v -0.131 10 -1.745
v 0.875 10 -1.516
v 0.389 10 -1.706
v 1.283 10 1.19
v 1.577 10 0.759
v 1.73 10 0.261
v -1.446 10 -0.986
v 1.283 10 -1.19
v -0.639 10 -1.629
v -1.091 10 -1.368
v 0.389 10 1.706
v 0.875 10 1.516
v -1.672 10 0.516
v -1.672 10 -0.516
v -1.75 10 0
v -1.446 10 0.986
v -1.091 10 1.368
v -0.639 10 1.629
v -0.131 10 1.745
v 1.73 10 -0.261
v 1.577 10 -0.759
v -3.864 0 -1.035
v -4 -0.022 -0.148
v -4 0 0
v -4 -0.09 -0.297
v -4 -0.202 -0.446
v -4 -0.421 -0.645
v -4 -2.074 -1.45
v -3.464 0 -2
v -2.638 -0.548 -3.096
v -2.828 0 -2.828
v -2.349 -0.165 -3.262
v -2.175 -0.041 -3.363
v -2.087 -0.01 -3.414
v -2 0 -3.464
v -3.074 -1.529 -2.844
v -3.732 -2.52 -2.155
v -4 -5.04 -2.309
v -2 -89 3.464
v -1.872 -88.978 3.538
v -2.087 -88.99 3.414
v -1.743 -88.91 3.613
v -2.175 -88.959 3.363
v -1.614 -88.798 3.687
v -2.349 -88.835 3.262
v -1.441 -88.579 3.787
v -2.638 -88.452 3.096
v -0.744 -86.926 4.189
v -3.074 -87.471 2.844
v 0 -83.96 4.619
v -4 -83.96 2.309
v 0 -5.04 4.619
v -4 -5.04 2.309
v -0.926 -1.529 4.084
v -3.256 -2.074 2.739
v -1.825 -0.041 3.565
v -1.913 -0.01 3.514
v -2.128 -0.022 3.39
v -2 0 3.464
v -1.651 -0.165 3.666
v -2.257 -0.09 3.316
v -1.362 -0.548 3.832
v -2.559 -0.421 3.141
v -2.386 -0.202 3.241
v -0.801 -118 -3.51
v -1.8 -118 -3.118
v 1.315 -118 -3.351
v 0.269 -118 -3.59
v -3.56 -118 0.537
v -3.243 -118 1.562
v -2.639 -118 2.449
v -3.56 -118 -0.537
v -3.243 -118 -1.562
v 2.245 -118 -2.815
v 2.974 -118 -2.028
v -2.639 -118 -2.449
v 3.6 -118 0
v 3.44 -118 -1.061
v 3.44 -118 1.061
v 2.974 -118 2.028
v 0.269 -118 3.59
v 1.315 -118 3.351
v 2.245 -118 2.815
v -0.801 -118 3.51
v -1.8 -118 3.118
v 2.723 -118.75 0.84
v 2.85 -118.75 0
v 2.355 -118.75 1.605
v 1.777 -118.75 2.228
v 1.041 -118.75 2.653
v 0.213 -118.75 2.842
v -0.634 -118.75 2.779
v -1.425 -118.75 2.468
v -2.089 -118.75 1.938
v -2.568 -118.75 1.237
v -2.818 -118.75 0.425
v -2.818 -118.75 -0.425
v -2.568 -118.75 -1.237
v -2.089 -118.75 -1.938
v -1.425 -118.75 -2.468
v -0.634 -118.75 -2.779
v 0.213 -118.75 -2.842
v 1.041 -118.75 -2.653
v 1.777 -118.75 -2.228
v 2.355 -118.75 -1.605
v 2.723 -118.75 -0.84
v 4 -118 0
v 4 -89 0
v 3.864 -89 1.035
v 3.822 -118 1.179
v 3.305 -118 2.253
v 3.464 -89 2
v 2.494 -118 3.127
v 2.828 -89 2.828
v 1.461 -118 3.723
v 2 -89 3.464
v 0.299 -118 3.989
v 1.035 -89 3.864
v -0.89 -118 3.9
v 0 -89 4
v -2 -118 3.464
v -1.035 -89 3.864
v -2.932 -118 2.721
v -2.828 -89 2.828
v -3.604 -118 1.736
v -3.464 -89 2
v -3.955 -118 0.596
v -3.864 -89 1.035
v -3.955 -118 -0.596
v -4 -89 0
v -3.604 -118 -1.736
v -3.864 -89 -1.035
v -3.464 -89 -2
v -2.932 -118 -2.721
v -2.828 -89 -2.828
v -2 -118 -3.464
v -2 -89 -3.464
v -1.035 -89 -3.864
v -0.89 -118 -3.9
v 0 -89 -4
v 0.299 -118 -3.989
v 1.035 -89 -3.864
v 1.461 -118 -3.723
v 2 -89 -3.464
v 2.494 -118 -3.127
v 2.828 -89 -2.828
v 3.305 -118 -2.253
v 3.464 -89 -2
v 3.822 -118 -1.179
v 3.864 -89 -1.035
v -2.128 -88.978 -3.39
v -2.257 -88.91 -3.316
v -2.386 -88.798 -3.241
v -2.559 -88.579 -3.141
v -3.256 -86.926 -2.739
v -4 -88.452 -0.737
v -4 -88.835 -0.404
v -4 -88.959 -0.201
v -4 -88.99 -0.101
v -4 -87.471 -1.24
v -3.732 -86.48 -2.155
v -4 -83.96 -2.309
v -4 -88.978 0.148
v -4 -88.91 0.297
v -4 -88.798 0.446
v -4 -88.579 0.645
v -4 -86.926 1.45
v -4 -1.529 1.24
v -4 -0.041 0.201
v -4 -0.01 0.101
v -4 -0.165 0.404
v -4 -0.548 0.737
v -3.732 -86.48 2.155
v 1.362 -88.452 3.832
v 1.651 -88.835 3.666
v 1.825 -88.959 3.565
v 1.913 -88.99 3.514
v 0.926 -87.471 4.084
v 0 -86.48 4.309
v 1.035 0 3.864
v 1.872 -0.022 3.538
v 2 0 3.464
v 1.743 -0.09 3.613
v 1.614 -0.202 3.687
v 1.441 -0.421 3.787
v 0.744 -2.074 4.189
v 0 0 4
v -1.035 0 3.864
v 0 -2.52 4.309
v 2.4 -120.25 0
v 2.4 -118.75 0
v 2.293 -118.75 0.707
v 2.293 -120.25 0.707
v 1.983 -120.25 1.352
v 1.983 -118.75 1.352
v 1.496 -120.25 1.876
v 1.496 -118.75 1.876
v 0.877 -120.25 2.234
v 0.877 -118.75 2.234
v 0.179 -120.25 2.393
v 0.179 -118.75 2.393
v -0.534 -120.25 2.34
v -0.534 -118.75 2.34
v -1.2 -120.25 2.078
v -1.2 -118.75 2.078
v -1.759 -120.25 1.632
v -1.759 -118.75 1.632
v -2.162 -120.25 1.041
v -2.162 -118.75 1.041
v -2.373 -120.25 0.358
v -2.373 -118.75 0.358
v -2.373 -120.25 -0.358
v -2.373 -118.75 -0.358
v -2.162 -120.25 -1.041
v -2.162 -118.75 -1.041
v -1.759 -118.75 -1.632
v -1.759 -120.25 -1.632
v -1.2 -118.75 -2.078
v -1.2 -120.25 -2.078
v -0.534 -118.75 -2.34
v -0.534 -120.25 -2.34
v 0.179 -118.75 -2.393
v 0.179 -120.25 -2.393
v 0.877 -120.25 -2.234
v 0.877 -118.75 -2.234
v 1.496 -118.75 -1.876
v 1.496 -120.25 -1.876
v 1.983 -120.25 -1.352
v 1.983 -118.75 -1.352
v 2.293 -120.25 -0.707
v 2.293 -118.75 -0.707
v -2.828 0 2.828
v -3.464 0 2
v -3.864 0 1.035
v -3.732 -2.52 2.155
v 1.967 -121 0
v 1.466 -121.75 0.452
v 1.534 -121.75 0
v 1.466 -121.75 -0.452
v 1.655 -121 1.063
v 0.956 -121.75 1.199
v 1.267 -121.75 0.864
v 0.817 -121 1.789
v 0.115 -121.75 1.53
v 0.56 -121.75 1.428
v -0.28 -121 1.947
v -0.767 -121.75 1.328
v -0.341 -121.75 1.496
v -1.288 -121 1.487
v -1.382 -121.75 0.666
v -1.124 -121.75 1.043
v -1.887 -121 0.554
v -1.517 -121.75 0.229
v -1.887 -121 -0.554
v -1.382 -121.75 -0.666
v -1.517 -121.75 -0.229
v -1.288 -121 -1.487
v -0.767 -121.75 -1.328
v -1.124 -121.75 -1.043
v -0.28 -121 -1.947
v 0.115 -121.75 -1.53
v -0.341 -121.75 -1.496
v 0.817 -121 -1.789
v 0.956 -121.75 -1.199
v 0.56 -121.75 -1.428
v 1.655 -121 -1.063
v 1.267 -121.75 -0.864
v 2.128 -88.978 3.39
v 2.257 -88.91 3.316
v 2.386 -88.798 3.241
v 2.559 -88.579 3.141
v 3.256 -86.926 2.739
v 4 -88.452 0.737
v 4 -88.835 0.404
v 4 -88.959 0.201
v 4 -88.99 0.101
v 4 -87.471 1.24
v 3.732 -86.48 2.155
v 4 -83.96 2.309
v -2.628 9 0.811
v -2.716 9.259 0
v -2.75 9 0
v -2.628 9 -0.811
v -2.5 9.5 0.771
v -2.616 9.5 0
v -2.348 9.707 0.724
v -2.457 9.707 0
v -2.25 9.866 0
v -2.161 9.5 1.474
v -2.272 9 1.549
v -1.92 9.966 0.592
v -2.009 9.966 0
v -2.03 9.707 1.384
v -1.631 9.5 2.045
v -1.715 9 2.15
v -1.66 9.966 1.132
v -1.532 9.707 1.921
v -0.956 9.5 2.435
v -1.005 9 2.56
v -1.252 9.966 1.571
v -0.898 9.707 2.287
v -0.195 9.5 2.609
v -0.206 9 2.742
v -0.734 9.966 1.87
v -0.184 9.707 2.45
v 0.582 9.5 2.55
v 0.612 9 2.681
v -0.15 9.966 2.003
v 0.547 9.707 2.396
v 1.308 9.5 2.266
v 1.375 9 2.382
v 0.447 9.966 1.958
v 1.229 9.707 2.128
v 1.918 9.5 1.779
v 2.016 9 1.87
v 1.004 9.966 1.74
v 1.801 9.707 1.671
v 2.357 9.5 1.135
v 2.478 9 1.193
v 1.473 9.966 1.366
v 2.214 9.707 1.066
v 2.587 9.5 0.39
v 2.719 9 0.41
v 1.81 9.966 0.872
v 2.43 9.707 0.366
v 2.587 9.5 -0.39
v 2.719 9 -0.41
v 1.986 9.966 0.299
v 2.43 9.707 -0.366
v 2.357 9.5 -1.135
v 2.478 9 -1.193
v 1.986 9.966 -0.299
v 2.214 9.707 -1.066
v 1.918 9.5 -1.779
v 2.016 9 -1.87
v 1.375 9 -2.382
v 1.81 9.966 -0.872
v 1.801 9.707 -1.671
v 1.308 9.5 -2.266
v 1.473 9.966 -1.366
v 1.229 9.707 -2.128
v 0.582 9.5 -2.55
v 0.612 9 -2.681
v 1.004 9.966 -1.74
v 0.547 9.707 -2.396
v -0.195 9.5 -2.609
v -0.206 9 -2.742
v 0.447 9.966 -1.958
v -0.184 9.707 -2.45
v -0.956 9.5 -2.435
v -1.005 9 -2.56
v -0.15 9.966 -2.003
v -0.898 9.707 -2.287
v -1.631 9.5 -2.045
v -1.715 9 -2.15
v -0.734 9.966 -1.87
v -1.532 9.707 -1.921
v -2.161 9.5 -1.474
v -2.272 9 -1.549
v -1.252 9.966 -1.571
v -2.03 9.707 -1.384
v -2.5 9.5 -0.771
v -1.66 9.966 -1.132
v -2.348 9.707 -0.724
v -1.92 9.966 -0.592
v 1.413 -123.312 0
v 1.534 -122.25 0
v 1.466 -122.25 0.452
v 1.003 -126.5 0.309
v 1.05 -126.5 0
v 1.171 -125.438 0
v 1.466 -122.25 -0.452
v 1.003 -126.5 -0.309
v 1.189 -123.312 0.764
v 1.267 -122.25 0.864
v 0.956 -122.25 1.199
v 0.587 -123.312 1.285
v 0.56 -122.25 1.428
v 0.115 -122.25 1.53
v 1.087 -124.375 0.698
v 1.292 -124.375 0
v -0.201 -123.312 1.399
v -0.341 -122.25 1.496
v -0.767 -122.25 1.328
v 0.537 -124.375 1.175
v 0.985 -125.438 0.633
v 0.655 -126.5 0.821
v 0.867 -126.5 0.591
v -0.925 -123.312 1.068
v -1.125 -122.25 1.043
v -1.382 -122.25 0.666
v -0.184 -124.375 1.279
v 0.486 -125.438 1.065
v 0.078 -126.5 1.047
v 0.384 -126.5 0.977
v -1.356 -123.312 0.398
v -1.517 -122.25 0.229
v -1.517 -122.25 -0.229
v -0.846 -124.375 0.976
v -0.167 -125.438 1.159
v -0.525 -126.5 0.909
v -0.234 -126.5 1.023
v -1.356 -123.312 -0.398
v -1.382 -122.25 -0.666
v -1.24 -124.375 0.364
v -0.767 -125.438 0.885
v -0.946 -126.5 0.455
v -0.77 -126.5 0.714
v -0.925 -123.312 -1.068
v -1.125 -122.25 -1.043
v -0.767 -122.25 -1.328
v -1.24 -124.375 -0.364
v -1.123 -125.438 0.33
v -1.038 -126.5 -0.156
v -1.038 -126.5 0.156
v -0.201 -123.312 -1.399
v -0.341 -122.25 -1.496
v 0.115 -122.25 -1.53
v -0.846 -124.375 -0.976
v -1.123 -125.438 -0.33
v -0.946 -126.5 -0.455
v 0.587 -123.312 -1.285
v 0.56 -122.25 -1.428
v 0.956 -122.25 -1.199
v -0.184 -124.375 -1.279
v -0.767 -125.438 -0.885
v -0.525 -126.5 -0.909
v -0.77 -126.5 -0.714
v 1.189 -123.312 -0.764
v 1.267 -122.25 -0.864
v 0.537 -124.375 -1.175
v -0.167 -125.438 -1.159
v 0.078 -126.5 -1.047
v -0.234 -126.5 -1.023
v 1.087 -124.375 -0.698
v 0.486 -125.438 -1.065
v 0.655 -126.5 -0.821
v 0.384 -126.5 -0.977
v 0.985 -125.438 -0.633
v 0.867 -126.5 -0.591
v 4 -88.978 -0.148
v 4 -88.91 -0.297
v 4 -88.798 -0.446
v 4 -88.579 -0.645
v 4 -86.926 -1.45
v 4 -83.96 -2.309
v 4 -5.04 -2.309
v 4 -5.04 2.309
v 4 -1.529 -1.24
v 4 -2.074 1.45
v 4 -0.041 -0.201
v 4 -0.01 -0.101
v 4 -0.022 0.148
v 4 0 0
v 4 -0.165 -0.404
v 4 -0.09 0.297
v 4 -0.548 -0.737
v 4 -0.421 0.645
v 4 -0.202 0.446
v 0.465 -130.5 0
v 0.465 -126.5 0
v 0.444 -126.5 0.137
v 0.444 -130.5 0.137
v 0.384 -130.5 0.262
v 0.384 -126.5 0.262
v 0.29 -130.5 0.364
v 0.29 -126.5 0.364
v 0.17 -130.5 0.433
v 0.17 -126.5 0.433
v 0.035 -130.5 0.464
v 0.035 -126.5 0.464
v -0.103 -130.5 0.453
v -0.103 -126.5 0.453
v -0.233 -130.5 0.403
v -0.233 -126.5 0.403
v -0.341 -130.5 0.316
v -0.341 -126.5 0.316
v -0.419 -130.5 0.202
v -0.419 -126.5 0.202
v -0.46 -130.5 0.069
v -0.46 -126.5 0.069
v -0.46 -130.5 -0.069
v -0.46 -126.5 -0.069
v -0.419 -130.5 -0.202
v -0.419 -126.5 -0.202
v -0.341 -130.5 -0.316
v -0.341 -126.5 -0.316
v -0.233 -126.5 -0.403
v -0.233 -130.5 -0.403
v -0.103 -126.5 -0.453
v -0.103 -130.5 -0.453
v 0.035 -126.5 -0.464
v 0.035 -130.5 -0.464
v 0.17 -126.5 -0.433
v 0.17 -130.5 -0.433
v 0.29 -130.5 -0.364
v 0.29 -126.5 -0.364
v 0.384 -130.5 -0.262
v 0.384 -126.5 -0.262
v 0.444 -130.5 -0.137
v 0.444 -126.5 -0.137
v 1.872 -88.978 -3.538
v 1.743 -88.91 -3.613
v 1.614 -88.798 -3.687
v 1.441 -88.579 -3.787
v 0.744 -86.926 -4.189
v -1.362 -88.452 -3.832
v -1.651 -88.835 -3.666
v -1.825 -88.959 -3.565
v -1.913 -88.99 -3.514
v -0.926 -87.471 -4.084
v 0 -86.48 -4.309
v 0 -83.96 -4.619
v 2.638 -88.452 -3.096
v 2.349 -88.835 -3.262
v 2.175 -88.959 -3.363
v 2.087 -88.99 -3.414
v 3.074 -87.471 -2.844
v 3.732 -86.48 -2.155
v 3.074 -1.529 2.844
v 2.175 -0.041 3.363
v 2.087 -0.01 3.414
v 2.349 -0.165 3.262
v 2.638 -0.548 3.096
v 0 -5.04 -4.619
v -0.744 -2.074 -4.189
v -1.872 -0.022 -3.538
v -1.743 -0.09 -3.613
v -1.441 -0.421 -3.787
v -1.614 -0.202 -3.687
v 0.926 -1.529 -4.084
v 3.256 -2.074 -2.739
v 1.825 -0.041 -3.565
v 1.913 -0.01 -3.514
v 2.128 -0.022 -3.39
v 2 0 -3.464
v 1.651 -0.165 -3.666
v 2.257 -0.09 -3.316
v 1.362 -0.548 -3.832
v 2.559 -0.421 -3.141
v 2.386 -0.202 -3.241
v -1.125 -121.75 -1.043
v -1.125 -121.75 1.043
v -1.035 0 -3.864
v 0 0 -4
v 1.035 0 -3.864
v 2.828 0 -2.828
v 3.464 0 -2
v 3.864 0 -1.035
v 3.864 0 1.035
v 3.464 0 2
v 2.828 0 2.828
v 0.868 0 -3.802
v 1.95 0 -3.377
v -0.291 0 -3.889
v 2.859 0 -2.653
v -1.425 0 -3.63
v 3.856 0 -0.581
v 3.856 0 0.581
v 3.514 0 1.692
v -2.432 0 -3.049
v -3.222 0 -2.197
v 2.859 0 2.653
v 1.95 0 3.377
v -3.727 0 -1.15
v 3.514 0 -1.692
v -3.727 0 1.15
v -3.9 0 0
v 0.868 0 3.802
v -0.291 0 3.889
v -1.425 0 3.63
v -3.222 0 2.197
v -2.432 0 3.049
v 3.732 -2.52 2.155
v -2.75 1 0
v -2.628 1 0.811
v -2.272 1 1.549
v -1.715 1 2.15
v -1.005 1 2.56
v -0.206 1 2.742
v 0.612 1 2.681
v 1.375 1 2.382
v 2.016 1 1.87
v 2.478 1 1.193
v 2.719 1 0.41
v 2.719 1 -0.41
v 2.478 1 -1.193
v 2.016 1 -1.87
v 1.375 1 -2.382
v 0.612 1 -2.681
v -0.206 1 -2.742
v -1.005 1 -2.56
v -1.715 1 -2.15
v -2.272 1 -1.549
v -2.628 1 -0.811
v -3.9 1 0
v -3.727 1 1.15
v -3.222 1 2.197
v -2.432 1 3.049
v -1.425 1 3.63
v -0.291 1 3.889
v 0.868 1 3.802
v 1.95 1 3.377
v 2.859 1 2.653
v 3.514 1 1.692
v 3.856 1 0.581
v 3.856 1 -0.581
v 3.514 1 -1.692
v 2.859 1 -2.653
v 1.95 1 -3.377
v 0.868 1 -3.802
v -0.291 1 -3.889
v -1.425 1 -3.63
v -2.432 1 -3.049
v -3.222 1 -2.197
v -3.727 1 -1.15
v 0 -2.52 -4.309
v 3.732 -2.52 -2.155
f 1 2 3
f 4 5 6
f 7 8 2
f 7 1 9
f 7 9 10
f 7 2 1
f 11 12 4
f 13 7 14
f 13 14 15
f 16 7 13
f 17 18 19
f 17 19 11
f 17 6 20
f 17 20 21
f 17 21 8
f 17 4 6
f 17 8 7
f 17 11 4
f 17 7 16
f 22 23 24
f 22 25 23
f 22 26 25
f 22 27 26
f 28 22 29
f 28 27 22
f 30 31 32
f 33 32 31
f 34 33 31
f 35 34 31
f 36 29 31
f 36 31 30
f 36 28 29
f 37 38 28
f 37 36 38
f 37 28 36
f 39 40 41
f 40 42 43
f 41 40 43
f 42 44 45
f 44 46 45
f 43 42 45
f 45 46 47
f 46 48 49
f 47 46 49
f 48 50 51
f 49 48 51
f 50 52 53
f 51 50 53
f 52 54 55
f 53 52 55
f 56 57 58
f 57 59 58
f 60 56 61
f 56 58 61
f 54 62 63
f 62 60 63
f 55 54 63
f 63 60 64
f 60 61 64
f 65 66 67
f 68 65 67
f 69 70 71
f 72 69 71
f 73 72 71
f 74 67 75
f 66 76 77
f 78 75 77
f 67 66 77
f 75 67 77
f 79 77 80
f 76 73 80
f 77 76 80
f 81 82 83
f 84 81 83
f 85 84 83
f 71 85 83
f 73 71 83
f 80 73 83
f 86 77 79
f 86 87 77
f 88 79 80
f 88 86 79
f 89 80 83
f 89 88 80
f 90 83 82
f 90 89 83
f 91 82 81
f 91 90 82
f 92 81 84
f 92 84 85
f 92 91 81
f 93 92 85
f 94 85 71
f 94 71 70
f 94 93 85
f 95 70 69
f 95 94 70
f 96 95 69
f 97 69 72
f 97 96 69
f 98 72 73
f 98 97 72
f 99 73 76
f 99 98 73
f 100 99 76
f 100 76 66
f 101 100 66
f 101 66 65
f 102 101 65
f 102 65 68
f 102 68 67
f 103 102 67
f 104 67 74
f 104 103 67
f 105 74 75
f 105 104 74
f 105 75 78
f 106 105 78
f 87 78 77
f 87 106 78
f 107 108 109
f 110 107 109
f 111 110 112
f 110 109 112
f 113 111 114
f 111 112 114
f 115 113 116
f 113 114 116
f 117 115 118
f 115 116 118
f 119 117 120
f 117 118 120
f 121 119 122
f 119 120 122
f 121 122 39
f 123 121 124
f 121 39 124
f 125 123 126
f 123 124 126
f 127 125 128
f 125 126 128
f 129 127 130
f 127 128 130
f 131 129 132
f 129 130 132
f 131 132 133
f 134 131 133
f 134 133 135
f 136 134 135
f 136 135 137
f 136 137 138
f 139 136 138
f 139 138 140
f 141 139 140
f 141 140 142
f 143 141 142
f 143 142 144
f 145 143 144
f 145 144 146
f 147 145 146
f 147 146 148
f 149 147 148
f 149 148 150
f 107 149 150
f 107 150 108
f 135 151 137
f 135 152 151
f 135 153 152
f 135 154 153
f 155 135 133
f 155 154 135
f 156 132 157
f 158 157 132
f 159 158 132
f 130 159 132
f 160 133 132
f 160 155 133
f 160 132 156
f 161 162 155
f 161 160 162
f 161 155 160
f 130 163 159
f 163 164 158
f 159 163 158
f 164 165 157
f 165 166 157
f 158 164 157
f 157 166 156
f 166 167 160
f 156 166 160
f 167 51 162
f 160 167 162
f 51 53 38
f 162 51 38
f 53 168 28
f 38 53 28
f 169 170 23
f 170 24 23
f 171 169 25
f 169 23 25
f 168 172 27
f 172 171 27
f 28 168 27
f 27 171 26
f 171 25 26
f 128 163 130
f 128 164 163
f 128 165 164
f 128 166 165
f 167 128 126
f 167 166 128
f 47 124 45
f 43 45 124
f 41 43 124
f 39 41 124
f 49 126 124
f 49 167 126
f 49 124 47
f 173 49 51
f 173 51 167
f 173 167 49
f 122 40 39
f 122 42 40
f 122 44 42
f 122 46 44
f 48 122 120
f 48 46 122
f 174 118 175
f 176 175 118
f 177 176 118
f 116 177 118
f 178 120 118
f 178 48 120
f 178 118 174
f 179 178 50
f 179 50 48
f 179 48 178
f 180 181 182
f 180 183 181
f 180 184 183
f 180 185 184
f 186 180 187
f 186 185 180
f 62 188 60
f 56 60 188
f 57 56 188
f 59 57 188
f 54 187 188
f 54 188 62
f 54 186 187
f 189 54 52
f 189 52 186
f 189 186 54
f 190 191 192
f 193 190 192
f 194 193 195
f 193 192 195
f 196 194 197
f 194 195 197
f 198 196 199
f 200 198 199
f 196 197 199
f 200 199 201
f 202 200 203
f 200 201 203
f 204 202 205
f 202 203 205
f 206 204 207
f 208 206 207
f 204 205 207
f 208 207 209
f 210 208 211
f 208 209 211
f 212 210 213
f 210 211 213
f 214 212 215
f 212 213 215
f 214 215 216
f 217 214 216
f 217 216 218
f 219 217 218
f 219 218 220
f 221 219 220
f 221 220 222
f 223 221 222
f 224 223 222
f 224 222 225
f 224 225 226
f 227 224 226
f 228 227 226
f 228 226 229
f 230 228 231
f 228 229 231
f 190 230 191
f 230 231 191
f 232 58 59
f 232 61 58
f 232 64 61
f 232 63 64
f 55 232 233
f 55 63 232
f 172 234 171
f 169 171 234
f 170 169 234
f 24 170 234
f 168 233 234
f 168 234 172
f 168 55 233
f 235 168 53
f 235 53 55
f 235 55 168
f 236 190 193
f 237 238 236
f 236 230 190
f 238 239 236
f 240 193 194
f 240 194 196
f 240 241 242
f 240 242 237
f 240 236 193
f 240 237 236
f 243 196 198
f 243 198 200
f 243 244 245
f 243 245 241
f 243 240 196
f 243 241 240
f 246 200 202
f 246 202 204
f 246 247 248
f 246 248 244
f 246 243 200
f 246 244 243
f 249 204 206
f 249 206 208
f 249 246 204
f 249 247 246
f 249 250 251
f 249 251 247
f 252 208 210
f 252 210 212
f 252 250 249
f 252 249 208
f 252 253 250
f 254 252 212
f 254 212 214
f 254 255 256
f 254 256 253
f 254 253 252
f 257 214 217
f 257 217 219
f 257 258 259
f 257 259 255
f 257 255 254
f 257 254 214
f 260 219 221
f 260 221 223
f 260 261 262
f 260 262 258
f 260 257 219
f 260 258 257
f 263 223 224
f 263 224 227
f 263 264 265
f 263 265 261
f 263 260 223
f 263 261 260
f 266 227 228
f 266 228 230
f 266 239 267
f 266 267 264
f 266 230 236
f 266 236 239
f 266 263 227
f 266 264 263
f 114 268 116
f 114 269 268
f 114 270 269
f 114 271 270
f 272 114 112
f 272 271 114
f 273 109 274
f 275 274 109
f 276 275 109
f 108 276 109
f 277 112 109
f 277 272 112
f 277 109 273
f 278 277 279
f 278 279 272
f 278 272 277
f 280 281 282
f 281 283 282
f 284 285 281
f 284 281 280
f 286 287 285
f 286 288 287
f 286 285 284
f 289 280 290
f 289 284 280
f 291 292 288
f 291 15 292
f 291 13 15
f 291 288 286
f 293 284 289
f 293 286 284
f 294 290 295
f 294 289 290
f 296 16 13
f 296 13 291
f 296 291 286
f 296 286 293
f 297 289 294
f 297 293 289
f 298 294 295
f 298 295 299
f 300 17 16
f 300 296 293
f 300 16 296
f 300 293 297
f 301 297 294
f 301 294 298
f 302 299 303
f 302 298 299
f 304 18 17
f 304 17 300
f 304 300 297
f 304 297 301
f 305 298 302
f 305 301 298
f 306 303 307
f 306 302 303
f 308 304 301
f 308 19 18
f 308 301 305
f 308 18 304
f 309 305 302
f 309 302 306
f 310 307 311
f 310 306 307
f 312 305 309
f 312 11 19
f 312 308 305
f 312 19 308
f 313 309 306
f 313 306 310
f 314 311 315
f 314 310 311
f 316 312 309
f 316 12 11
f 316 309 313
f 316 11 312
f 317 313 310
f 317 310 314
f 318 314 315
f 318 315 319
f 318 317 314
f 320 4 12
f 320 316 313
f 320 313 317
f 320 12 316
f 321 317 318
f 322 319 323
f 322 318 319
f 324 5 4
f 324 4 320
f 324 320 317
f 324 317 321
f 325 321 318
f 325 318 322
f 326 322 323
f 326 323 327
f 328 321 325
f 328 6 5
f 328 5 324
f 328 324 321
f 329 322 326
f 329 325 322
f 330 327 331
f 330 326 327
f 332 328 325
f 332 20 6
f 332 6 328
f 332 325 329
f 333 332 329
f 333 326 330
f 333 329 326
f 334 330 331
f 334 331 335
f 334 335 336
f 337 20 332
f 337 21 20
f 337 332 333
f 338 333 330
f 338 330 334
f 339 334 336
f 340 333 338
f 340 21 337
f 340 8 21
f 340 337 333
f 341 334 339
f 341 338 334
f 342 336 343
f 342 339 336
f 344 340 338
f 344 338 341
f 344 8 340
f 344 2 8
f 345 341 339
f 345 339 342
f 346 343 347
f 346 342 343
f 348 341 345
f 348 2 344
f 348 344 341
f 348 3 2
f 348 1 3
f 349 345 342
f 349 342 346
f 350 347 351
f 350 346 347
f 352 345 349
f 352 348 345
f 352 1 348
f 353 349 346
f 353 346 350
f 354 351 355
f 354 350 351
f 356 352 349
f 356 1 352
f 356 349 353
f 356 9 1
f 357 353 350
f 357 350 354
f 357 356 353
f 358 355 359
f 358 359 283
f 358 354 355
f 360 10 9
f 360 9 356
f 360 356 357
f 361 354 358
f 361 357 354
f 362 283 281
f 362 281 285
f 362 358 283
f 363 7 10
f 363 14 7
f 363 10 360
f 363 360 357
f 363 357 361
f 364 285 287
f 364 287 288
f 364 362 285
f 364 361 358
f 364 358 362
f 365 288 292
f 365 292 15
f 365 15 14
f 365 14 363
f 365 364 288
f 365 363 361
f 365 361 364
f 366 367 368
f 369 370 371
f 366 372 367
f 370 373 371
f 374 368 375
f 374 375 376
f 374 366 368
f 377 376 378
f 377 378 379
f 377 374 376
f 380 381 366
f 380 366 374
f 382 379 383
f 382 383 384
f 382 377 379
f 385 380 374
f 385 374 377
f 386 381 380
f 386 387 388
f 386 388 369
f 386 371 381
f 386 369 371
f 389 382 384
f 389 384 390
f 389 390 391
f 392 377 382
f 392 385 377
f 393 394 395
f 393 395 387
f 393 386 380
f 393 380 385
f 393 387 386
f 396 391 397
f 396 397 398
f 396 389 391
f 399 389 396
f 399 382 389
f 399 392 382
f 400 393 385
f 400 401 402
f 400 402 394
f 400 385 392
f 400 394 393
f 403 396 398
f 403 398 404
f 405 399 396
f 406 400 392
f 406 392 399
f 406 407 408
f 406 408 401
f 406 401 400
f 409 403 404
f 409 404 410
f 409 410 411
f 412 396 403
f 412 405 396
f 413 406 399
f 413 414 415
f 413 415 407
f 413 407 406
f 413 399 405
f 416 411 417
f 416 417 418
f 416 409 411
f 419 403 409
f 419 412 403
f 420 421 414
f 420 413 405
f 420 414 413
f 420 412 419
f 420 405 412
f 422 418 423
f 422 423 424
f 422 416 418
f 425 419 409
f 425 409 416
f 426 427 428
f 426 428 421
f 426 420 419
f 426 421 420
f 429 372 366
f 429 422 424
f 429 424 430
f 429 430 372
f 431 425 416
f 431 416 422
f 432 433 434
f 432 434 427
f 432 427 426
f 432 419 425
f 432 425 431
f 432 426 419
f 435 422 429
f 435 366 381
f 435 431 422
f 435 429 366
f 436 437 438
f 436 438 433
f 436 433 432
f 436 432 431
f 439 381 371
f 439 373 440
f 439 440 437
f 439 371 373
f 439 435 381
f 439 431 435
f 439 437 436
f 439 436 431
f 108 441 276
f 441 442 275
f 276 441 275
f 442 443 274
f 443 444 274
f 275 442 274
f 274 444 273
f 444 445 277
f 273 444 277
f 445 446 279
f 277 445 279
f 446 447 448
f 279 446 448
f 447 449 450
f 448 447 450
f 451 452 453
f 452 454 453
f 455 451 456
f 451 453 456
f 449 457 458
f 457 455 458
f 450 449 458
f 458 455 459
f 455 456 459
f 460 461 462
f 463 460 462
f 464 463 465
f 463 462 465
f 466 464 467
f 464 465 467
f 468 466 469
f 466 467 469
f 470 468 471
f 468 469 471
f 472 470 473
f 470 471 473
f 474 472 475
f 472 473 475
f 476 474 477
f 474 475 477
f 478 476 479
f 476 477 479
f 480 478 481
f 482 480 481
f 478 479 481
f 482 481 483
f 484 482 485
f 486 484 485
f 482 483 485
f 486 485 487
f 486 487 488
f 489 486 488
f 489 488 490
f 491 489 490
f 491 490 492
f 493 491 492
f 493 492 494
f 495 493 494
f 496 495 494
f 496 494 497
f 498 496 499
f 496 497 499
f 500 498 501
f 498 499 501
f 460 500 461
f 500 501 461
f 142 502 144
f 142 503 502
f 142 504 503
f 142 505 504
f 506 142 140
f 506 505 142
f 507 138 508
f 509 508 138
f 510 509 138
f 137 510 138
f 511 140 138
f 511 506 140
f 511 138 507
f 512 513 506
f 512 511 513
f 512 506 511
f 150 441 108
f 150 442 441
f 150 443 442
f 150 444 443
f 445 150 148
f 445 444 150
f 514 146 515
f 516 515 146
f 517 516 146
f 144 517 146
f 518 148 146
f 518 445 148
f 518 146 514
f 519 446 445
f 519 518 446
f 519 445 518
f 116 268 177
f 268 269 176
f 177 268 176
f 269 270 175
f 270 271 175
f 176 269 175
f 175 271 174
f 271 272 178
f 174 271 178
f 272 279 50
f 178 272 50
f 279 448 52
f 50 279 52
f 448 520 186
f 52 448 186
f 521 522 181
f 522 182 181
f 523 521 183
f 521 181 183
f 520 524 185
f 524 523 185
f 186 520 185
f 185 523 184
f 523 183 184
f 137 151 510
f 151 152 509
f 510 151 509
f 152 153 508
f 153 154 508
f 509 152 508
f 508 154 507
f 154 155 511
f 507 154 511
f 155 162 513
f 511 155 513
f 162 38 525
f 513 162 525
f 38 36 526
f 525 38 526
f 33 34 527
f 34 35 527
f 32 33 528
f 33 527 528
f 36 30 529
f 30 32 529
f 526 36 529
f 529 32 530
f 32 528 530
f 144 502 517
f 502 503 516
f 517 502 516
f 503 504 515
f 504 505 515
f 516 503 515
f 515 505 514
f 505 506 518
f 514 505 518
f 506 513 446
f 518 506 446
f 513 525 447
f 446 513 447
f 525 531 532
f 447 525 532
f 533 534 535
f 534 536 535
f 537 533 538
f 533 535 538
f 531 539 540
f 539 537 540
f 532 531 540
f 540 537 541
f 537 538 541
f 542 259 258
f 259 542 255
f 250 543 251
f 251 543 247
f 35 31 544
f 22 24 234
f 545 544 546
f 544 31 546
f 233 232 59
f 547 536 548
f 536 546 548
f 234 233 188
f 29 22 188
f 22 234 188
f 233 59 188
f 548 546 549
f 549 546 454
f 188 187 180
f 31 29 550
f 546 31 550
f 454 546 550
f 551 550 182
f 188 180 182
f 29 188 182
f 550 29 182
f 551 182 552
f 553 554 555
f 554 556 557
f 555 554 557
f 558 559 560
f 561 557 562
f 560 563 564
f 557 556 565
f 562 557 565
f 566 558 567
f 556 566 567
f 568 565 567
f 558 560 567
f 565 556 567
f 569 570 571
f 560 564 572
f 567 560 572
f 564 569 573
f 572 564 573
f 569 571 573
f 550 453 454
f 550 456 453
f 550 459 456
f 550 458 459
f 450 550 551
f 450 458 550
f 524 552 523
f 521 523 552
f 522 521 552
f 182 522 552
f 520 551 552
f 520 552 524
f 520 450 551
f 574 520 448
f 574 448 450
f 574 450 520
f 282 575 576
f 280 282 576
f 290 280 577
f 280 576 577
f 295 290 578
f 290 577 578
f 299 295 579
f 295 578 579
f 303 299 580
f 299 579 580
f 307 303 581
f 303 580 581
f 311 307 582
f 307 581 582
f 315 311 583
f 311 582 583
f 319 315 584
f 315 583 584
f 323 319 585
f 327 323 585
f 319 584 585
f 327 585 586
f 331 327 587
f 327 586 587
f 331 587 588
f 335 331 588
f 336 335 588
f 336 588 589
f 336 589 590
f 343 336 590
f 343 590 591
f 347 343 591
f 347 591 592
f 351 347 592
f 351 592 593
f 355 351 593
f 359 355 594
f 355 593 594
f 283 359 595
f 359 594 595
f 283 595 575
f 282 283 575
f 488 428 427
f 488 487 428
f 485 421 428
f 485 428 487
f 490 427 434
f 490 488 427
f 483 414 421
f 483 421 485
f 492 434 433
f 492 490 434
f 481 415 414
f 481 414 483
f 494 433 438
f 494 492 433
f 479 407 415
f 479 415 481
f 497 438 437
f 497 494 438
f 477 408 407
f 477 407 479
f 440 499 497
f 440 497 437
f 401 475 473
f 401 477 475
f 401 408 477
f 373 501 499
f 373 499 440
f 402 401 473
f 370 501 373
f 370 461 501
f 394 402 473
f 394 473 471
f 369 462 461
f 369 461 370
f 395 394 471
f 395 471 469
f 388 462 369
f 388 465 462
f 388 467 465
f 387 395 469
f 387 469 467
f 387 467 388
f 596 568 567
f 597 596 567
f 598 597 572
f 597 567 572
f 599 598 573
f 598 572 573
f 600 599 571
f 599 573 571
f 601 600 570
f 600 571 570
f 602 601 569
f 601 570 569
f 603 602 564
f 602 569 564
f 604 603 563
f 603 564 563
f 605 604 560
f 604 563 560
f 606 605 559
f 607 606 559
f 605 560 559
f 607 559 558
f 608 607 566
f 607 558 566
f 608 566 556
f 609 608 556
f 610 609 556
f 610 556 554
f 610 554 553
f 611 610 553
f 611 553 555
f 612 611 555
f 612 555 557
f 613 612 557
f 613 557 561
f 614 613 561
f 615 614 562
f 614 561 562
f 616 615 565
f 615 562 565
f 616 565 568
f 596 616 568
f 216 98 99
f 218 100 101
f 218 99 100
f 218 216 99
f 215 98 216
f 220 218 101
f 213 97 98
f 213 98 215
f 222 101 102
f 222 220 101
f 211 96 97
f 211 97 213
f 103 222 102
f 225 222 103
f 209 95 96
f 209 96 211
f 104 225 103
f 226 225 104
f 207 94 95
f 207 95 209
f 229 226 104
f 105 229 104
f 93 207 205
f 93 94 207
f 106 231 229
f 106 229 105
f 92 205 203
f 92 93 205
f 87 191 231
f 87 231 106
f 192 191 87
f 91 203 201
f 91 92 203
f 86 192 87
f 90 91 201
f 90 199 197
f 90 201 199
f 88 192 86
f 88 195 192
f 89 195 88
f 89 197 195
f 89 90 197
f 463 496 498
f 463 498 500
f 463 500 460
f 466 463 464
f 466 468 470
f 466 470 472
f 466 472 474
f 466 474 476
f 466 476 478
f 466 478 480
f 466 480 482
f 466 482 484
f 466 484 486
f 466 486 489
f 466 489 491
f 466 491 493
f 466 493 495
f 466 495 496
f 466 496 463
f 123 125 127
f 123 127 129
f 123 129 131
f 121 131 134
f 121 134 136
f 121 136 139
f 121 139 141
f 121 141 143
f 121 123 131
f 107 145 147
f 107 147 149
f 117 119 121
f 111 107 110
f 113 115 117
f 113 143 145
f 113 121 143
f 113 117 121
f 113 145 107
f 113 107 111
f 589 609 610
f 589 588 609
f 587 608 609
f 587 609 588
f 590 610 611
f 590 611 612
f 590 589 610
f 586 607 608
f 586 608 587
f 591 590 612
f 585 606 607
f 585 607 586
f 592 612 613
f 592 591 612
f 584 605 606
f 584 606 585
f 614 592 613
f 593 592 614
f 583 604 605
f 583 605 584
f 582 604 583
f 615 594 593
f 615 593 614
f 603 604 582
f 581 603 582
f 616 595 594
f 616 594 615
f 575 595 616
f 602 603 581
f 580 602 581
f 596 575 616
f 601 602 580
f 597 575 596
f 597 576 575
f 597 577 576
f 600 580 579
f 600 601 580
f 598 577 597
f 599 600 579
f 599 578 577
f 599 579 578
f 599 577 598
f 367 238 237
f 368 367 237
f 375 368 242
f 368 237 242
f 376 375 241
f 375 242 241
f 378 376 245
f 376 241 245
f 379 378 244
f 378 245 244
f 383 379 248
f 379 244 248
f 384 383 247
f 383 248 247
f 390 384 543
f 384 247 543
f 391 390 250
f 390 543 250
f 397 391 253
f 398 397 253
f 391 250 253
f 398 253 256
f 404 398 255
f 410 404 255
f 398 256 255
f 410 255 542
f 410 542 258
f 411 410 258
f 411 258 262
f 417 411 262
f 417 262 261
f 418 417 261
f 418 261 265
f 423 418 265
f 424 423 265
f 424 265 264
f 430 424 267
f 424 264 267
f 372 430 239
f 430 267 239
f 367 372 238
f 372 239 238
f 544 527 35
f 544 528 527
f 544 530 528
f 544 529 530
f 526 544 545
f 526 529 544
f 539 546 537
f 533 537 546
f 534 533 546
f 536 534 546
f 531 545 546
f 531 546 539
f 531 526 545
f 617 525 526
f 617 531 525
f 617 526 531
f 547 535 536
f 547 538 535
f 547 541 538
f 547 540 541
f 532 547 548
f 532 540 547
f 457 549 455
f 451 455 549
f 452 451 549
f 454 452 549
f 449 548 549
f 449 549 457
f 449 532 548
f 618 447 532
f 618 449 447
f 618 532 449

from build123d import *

# Parameters (mm, degrees)
F1_DEPTH  = 89
F2_R      = 4
F3_DEPTH  = 29
F4_R      = 6
F4_R_2    = 4
F5_DEPTH  = 5.2
F5_TAPER  = 7
F6_R      = 6
F6_R_2    = 4
F7_DEPTH  = 5.2
F7_TAPER  = 7
F8_R      = 3.6
F9_DEPTH  = 0.75
F9_TAPER  = 45
F10_R     = 2.4
F11_DEPTH = 1.5
F12_R     = 2.4
F13_DEPTH = 1.5
F13_TAPER = 30
F14_R     = 1.534
F15_DEPTH = 0.5
F16_R     = 1.534
F17_DEPTH = 4.25
F17_TAPER = 6.5
F18_R     = 0.465
F19_DEPTH = 4
F20_R     = 3.9
F21_DEPTH = 1
F22_R     = 2.75
F23_DEPTH = 9
F24_R     = 1


with BuildPart() as f1:
    # F0 (on Front) → F1 (new body)
    with BuildSketch(Plane.XZ):
        Polygon((4, -2.3094010768), (4, 2.3094010768), (0, 4.6188021535), (-4, 2.3094010768), (-4, -2.3094010768), (0, -4.6188021535), align=None)
    extrude(amount=F1_DEPTH)

    # F2 (on face) → F3 (join)
    with BuildSketch(Plane.XZ.offset(89)):
        Circle(F2_R)
    extrude(amount=F3_DEPTH)

    # F4 (on face) → F5 (cut)
    with BuildSketch(Plane.XZ.offset(89)):
        Circle(F4_R)
        Circle(F4_R_2, mode=Mode.SUBTRACT)
    extrude(amount=-F5_DEPTH, taper=F5_TAPER, mode=Mode.SUBTRACT)

    # F6 (on face) → F7 (cut)
    with BuildSketch(Plane(origin=(0, 0, 0), x_dir=(-1, 0, 0), z_dir=(0, 1, 0))):
        Circle(F6_R)
        Circle(F6_R_2, mode=Mode.SUBTRACT)
    extrude(amount=-F7_DEPTH, taper=F7_TAPER, mode=Mode.SUBTRACT)


with BuildPart() as f9:
    # F8 (on face) → F9 (new body)
    with BuildSketch(Plane.XZ.offset(118)):
        Circle(F8_R)
    extrude(amount=F9_DEPTH, taper=F9_TAPER)

    # F10 (on face) → F11 (join)
    with BuildSketch(Plane.XZ.offset(118.75)):
        Circle(F10_R)
    extrude(amount=F11_DEPTH)

    # F12 (on face) → F13 (join)
    with BuildSketch(Plane.XZ.offset(120.25)):
        Circle(F12_R)
    extrude(amount=F13_DEPTH, taper=F13_TAPER)

    # F14 (on face) → F15 (join)
    with BuildSketch(Plane.XZ.offset(121.75)):
        Circle(F14_R)
    extrude(amount=F15_DEPTH)

    # F16 (on face) → F17 (join)
    with BuildSketch(Plane.XZ.offset(122.25)):
        Circle(F16_R)
    extrude(amount=F17_DEPTH, taper=F17_TAPER)

    # F18 (on face) → F19 (join)
    with BuildSketch(Plane.XZ.offset(126.5)):
        Circle(F18_R)
    extrude(amount=F19_DEPTH)


with BuildPart() as f21:
    # F20 (on face) → F21 (new body)
    with BuildSketch(Plane(origin=(0, 0, 0), x_dir=(-1, 0, 0), z_dir=(0, 1, 0))):
        Circle(F20_R)
    extrude(amount=F21_DEPTH)

    # F22 (on face) → F23 (join)
    with BuildSketch(Plane(origin=(0, 1, 0), x_dir=(-1, 0, 0), z_dir=(0, 1, 0))):
        Circle(F22_R)
    extrude(amount=F23_DEPTH)

    # F24
    f24_edges = [f21.edges().sort_by_distance(p)[0] for p in [
        (2.75, 10, 0),
    ]]
    fillet(f24_edges, radius=F24_R)


solid = Compound([f1.part, f9.part, f21.part])
